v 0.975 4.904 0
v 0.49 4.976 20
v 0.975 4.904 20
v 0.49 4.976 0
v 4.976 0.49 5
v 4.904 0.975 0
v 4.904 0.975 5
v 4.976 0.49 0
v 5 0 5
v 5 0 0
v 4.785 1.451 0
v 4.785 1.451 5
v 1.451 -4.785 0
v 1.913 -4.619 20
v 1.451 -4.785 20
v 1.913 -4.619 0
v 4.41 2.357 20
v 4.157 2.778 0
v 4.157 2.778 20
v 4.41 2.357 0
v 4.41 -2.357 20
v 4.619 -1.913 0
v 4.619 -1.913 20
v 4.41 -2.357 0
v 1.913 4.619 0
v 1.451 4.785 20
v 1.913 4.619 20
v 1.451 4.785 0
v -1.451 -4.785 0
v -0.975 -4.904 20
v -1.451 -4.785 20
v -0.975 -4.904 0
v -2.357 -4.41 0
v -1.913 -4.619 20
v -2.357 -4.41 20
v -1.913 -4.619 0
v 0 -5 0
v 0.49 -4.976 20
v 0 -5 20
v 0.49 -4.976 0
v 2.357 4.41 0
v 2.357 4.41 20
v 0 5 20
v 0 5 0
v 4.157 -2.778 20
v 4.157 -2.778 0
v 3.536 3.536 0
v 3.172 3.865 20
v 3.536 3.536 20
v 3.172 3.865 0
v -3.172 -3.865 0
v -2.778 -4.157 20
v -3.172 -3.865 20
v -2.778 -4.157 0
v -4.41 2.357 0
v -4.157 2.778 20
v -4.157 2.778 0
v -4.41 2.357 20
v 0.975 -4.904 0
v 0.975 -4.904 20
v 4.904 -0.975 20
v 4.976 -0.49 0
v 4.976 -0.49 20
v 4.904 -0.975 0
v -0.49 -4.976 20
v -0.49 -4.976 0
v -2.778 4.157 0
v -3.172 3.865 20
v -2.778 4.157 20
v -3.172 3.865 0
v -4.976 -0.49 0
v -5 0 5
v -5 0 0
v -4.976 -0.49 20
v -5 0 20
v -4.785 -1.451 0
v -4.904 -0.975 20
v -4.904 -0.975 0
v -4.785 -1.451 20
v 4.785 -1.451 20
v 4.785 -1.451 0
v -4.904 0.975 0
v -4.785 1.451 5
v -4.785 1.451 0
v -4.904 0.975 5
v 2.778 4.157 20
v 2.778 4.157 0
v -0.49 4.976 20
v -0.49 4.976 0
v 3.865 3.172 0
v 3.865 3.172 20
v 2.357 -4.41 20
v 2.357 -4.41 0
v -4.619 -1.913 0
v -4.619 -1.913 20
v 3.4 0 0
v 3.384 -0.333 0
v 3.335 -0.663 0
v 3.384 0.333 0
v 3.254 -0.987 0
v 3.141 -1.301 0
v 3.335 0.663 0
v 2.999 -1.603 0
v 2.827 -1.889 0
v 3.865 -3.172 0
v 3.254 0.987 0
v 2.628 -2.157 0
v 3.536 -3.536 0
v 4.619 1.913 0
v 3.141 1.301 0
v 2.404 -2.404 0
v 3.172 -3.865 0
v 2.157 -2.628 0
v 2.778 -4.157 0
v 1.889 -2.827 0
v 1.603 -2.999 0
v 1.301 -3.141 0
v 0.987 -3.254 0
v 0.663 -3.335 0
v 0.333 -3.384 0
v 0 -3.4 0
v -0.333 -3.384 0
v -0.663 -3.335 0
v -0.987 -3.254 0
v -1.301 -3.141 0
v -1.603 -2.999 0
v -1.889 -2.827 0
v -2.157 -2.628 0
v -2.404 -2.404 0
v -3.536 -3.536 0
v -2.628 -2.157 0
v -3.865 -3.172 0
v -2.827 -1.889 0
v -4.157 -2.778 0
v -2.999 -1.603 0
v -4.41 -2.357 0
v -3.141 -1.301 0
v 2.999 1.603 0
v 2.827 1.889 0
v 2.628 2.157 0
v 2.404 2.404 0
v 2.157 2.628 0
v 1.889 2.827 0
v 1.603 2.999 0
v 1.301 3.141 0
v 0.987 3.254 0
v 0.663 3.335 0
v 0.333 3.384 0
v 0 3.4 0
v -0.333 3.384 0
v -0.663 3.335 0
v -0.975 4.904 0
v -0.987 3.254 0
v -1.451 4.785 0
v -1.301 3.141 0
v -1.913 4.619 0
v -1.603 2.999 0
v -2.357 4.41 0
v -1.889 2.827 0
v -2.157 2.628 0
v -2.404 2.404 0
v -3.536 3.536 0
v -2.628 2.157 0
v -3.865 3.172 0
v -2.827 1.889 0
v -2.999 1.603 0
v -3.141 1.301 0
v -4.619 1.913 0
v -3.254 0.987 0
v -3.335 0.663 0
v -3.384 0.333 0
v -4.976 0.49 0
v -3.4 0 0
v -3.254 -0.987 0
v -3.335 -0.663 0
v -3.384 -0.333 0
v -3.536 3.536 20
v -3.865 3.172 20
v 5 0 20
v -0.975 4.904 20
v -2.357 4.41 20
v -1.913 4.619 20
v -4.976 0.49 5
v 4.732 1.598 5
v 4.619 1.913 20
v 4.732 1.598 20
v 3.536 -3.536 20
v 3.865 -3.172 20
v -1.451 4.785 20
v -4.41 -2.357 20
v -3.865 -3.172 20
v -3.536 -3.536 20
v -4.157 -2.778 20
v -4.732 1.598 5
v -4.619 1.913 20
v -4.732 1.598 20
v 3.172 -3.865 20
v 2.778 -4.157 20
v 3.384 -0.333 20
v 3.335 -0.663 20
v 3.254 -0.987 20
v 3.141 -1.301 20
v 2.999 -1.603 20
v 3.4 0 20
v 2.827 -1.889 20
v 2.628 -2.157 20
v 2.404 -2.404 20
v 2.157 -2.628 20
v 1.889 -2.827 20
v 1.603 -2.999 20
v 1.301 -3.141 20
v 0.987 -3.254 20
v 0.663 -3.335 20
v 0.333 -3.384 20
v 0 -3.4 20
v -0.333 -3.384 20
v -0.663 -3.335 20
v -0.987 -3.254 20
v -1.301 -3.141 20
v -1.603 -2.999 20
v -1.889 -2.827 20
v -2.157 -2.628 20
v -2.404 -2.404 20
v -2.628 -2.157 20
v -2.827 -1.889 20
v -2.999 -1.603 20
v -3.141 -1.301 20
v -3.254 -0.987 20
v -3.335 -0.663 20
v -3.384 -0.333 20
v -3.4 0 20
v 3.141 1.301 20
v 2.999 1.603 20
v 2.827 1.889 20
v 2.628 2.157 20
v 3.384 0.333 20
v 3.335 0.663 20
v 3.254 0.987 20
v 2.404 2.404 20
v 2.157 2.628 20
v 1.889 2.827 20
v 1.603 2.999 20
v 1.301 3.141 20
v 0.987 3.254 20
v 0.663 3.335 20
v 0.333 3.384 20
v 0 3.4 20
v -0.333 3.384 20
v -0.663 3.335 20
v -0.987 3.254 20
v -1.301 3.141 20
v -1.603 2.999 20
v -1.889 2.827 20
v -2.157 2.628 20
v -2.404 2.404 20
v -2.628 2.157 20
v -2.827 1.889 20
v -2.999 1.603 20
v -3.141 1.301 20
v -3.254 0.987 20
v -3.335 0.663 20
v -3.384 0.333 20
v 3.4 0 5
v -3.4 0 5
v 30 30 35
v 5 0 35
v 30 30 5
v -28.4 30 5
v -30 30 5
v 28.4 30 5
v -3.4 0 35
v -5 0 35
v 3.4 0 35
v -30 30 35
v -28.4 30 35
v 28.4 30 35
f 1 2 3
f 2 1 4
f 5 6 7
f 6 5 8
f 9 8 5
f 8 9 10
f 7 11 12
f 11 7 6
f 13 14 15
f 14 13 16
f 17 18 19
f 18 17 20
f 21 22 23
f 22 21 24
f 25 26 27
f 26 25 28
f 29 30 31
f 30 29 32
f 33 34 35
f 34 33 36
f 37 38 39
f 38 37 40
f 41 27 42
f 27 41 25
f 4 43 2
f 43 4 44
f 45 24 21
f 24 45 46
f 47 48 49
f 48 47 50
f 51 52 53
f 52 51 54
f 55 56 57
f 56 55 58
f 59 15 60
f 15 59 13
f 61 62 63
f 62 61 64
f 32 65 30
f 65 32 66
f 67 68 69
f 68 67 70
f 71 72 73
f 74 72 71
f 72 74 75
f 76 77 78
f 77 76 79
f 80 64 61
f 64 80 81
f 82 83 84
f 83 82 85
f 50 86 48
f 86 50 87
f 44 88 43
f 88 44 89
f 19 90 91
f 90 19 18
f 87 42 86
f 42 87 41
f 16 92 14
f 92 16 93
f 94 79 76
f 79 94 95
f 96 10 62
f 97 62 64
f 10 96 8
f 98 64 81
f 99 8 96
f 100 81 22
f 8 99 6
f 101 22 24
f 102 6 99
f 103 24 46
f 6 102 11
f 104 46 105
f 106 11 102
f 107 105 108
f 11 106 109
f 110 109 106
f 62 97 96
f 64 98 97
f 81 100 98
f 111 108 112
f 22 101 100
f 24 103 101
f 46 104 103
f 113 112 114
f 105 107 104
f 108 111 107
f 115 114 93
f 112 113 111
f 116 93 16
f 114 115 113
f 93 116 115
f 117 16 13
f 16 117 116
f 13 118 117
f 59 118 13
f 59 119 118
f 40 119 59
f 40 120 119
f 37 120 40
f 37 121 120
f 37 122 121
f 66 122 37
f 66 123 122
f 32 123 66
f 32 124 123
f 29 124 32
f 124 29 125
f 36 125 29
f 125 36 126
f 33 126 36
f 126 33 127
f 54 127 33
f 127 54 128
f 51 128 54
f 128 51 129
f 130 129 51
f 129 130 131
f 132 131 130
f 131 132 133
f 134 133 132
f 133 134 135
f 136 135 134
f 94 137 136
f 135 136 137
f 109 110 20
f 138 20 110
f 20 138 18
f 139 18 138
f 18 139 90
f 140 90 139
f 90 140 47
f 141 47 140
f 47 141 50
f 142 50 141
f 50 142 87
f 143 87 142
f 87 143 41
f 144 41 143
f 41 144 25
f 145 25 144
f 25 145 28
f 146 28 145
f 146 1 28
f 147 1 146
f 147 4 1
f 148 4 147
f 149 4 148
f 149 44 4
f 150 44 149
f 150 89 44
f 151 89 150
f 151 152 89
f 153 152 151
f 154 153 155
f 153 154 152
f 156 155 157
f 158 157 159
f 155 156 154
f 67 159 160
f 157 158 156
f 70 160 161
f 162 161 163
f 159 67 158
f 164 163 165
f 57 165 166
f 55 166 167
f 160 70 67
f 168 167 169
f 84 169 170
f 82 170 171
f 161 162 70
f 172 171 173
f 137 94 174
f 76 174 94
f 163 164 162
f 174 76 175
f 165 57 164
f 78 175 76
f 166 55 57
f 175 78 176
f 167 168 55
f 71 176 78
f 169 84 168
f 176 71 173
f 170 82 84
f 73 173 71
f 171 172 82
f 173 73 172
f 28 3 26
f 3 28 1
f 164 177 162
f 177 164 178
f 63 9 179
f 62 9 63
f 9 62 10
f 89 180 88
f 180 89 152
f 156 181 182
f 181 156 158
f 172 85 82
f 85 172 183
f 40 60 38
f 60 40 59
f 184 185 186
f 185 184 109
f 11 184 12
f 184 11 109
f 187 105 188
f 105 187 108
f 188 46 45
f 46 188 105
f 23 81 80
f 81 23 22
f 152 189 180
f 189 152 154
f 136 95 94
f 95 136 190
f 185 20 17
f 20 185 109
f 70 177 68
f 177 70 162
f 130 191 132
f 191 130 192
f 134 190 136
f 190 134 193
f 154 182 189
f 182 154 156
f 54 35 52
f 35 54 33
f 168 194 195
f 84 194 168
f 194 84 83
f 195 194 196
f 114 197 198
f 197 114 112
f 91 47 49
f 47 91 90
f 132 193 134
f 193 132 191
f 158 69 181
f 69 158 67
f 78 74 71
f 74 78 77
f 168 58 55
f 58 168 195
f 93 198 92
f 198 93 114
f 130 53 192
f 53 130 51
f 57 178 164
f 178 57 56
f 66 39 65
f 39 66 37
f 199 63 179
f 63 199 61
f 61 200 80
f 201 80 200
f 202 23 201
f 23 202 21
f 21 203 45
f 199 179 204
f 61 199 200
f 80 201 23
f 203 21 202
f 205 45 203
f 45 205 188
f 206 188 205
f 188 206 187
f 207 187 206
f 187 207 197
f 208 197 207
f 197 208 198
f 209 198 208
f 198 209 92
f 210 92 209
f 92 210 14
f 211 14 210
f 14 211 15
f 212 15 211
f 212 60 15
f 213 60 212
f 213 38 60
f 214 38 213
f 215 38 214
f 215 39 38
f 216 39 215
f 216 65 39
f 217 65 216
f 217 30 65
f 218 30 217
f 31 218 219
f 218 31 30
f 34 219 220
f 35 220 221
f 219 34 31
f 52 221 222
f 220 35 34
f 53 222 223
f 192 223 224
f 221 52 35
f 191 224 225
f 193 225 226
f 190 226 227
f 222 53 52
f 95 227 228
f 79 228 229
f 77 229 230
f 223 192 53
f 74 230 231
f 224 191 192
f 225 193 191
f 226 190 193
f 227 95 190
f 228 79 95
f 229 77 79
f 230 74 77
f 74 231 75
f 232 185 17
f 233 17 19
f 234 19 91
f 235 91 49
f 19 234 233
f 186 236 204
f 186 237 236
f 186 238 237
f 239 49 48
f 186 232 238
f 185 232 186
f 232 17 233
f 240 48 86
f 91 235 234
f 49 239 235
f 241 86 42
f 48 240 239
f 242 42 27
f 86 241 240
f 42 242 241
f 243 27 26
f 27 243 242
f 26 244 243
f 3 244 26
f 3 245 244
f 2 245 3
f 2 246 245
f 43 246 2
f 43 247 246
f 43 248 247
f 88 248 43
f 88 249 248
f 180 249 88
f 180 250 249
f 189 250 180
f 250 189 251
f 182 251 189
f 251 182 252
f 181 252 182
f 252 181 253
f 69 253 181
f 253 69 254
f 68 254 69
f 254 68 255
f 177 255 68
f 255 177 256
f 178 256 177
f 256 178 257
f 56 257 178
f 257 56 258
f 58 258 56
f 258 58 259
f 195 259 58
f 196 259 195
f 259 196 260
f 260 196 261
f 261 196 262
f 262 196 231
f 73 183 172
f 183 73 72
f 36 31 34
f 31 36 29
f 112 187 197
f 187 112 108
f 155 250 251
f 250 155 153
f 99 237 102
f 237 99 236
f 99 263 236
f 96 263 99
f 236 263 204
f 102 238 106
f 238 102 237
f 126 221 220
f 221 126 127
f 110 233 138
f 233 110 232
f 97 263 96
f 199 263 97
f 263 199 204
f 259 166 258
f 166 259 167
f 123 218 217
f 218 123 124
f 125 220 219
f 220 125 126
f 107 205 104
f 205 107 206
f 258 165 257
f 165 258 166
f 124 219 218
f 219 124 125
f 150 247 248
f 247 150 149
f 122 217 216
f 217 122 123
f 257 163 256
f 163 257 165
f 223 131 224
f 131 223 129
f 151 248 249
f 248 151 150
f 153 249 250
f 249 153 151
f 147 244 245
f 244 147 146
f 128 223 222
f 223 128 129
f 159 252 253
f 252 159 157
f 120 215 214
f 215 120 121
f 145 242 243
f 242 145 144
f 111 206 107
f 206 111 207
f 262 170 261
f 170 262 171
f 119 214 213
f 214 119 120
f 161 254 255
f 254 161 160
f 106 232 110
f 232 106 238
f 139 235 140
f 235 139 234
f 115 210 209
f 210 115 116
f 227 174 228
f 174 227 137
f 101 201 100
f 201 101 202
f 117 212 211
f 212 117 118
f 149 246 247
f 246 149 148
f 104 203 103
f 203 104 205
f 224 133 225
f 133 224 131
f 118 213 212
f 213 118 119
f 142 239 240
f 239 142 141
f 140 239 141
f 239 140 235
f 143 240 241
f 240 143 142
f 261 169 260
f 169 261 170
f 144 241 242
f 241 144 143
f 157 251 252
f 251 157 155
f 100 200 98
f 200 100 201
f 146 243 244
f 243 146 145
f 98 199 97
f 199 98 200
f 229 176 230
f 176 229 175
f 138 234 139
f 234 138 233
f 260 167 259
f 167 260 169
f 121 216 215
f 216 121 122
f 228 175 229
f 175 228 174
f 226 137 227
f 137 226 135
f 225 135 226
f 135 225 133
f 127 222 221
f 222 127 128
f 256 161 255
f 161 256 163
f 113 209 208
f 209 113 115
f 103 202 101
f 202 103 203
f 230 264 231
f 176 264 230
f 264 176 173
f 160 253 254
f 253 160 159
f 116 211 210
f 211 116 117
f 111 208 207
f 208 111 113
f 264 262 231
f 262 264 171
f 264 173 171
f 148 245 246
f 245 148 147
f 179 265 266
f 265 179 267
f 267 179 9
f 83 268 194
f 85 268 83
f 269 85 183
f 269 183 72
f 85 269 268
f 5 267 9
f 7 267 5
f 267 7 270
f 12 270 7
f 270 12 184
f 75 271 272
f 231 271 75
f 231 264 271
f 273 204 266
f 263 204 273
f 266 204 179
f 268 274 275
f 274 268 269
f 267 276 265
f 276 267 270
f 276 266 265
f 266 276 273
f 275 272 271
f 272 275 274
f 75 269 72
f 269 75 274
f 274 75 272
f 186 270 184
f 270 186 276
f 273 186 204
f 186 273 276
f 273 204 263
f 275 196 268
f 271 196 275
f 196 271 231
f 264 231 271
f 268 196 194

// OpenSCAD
// Lab Funnel Design
// Units: millimetres
// Orientation: Upright, wide opening at top, rests on XY plane at z=0.

// --- Dimensions ---
// Spout (Tube)
$spout_outer_diameter = 10;
$spout_inner_diameter = 6.8; // 10 - 2*1.6
$spout_length = 20;

// Cone (Funnel)
$cone_bottom_diameter = 10; // Matches spout outer diameter
$cone_top_diameter = 60;
$cone_height = 30; // From z=20 to z=50

// Wall Thickness
$wall_thickness = 1.6;

// Resolution for curved surfaces
$fn = 64;

// --- Helper Functions ---

// Function to create a hollow cylinder (tube)
// Arguments: outer_d, inner_d, height, position (x,y,z)
module hollow_cylinder(outer_d, inner_d, height, pos = [0,0,0]) {
    translate(pos) {
        difference() {
            cylinder(h = height, d = outer_d, $fn = $fn);
            cylinder(h = height, d = inner_d, $fn = $fn);
        }
    }
}

// Function to create a hollow cone using linear_extrude
// Arguments: bottom_d, top_d, height, position (x,y,z)
// bottom_d is at z=pos[2], top_d is at z=pos[2]+height
module hollow_cone(bottom_d, top_d, height, pos = [0,0,0]) {
    translate(pos) {
        // Calculate inner diameters at bottom and top to maintain wall thickness
        inner_bottom_d = bottom_d - 2 * $wall_thickness;
        inner_top_d = top_d - 2 * $wall_thickness;

        // Create the outer profile polygon in the XZ plane
        // Points: Bottom-Left, Top-Left, Top-Right, Bottom-Right
        // We use linear_extrude along Y to create the 3D shape
        difference() {
            // Outer Shell
            linear_extrude(height = height, center = true, convexity = 1) {
                polygon(points = [
                    [-bottom_d/2, 0],
                    [bottom_d/2, 0],
                    [top_d/2, height],
                    [-top_d/2, height]
                ]);
            }
            
            // Inner Hole (Negative space)
            linear_extrude(height = height, center = true, convexity = 1) {
                polygon(points = [
                    [-inner_bottom_d/2, 0],
                    [inner_bottom_d/2, 0],
                    [inner_top_d/2, height],
                    [-inner_top_d/2, height]
                ]);
            }
        }
    }
}

// --- Main Assembly ---

// 1. Build the Spout (Tube)
// Starts at z=0, ends at z=20
hollow_cylinder(
    outer_d = $spout_outer_diameter,
    inner_d = $spout_inner_diameter,
    height = $spout_length,
    pos = [0, 0, 0]
);

// 2. Build the Cone
// Starts at z=20, ends at z=50
hollow_cone(
    bottom_d = $cone_bottom_diameter,
    top_d = $cone_top_diameter,
    height = $cone_height,
    pos = [0, 0, 20]
);
